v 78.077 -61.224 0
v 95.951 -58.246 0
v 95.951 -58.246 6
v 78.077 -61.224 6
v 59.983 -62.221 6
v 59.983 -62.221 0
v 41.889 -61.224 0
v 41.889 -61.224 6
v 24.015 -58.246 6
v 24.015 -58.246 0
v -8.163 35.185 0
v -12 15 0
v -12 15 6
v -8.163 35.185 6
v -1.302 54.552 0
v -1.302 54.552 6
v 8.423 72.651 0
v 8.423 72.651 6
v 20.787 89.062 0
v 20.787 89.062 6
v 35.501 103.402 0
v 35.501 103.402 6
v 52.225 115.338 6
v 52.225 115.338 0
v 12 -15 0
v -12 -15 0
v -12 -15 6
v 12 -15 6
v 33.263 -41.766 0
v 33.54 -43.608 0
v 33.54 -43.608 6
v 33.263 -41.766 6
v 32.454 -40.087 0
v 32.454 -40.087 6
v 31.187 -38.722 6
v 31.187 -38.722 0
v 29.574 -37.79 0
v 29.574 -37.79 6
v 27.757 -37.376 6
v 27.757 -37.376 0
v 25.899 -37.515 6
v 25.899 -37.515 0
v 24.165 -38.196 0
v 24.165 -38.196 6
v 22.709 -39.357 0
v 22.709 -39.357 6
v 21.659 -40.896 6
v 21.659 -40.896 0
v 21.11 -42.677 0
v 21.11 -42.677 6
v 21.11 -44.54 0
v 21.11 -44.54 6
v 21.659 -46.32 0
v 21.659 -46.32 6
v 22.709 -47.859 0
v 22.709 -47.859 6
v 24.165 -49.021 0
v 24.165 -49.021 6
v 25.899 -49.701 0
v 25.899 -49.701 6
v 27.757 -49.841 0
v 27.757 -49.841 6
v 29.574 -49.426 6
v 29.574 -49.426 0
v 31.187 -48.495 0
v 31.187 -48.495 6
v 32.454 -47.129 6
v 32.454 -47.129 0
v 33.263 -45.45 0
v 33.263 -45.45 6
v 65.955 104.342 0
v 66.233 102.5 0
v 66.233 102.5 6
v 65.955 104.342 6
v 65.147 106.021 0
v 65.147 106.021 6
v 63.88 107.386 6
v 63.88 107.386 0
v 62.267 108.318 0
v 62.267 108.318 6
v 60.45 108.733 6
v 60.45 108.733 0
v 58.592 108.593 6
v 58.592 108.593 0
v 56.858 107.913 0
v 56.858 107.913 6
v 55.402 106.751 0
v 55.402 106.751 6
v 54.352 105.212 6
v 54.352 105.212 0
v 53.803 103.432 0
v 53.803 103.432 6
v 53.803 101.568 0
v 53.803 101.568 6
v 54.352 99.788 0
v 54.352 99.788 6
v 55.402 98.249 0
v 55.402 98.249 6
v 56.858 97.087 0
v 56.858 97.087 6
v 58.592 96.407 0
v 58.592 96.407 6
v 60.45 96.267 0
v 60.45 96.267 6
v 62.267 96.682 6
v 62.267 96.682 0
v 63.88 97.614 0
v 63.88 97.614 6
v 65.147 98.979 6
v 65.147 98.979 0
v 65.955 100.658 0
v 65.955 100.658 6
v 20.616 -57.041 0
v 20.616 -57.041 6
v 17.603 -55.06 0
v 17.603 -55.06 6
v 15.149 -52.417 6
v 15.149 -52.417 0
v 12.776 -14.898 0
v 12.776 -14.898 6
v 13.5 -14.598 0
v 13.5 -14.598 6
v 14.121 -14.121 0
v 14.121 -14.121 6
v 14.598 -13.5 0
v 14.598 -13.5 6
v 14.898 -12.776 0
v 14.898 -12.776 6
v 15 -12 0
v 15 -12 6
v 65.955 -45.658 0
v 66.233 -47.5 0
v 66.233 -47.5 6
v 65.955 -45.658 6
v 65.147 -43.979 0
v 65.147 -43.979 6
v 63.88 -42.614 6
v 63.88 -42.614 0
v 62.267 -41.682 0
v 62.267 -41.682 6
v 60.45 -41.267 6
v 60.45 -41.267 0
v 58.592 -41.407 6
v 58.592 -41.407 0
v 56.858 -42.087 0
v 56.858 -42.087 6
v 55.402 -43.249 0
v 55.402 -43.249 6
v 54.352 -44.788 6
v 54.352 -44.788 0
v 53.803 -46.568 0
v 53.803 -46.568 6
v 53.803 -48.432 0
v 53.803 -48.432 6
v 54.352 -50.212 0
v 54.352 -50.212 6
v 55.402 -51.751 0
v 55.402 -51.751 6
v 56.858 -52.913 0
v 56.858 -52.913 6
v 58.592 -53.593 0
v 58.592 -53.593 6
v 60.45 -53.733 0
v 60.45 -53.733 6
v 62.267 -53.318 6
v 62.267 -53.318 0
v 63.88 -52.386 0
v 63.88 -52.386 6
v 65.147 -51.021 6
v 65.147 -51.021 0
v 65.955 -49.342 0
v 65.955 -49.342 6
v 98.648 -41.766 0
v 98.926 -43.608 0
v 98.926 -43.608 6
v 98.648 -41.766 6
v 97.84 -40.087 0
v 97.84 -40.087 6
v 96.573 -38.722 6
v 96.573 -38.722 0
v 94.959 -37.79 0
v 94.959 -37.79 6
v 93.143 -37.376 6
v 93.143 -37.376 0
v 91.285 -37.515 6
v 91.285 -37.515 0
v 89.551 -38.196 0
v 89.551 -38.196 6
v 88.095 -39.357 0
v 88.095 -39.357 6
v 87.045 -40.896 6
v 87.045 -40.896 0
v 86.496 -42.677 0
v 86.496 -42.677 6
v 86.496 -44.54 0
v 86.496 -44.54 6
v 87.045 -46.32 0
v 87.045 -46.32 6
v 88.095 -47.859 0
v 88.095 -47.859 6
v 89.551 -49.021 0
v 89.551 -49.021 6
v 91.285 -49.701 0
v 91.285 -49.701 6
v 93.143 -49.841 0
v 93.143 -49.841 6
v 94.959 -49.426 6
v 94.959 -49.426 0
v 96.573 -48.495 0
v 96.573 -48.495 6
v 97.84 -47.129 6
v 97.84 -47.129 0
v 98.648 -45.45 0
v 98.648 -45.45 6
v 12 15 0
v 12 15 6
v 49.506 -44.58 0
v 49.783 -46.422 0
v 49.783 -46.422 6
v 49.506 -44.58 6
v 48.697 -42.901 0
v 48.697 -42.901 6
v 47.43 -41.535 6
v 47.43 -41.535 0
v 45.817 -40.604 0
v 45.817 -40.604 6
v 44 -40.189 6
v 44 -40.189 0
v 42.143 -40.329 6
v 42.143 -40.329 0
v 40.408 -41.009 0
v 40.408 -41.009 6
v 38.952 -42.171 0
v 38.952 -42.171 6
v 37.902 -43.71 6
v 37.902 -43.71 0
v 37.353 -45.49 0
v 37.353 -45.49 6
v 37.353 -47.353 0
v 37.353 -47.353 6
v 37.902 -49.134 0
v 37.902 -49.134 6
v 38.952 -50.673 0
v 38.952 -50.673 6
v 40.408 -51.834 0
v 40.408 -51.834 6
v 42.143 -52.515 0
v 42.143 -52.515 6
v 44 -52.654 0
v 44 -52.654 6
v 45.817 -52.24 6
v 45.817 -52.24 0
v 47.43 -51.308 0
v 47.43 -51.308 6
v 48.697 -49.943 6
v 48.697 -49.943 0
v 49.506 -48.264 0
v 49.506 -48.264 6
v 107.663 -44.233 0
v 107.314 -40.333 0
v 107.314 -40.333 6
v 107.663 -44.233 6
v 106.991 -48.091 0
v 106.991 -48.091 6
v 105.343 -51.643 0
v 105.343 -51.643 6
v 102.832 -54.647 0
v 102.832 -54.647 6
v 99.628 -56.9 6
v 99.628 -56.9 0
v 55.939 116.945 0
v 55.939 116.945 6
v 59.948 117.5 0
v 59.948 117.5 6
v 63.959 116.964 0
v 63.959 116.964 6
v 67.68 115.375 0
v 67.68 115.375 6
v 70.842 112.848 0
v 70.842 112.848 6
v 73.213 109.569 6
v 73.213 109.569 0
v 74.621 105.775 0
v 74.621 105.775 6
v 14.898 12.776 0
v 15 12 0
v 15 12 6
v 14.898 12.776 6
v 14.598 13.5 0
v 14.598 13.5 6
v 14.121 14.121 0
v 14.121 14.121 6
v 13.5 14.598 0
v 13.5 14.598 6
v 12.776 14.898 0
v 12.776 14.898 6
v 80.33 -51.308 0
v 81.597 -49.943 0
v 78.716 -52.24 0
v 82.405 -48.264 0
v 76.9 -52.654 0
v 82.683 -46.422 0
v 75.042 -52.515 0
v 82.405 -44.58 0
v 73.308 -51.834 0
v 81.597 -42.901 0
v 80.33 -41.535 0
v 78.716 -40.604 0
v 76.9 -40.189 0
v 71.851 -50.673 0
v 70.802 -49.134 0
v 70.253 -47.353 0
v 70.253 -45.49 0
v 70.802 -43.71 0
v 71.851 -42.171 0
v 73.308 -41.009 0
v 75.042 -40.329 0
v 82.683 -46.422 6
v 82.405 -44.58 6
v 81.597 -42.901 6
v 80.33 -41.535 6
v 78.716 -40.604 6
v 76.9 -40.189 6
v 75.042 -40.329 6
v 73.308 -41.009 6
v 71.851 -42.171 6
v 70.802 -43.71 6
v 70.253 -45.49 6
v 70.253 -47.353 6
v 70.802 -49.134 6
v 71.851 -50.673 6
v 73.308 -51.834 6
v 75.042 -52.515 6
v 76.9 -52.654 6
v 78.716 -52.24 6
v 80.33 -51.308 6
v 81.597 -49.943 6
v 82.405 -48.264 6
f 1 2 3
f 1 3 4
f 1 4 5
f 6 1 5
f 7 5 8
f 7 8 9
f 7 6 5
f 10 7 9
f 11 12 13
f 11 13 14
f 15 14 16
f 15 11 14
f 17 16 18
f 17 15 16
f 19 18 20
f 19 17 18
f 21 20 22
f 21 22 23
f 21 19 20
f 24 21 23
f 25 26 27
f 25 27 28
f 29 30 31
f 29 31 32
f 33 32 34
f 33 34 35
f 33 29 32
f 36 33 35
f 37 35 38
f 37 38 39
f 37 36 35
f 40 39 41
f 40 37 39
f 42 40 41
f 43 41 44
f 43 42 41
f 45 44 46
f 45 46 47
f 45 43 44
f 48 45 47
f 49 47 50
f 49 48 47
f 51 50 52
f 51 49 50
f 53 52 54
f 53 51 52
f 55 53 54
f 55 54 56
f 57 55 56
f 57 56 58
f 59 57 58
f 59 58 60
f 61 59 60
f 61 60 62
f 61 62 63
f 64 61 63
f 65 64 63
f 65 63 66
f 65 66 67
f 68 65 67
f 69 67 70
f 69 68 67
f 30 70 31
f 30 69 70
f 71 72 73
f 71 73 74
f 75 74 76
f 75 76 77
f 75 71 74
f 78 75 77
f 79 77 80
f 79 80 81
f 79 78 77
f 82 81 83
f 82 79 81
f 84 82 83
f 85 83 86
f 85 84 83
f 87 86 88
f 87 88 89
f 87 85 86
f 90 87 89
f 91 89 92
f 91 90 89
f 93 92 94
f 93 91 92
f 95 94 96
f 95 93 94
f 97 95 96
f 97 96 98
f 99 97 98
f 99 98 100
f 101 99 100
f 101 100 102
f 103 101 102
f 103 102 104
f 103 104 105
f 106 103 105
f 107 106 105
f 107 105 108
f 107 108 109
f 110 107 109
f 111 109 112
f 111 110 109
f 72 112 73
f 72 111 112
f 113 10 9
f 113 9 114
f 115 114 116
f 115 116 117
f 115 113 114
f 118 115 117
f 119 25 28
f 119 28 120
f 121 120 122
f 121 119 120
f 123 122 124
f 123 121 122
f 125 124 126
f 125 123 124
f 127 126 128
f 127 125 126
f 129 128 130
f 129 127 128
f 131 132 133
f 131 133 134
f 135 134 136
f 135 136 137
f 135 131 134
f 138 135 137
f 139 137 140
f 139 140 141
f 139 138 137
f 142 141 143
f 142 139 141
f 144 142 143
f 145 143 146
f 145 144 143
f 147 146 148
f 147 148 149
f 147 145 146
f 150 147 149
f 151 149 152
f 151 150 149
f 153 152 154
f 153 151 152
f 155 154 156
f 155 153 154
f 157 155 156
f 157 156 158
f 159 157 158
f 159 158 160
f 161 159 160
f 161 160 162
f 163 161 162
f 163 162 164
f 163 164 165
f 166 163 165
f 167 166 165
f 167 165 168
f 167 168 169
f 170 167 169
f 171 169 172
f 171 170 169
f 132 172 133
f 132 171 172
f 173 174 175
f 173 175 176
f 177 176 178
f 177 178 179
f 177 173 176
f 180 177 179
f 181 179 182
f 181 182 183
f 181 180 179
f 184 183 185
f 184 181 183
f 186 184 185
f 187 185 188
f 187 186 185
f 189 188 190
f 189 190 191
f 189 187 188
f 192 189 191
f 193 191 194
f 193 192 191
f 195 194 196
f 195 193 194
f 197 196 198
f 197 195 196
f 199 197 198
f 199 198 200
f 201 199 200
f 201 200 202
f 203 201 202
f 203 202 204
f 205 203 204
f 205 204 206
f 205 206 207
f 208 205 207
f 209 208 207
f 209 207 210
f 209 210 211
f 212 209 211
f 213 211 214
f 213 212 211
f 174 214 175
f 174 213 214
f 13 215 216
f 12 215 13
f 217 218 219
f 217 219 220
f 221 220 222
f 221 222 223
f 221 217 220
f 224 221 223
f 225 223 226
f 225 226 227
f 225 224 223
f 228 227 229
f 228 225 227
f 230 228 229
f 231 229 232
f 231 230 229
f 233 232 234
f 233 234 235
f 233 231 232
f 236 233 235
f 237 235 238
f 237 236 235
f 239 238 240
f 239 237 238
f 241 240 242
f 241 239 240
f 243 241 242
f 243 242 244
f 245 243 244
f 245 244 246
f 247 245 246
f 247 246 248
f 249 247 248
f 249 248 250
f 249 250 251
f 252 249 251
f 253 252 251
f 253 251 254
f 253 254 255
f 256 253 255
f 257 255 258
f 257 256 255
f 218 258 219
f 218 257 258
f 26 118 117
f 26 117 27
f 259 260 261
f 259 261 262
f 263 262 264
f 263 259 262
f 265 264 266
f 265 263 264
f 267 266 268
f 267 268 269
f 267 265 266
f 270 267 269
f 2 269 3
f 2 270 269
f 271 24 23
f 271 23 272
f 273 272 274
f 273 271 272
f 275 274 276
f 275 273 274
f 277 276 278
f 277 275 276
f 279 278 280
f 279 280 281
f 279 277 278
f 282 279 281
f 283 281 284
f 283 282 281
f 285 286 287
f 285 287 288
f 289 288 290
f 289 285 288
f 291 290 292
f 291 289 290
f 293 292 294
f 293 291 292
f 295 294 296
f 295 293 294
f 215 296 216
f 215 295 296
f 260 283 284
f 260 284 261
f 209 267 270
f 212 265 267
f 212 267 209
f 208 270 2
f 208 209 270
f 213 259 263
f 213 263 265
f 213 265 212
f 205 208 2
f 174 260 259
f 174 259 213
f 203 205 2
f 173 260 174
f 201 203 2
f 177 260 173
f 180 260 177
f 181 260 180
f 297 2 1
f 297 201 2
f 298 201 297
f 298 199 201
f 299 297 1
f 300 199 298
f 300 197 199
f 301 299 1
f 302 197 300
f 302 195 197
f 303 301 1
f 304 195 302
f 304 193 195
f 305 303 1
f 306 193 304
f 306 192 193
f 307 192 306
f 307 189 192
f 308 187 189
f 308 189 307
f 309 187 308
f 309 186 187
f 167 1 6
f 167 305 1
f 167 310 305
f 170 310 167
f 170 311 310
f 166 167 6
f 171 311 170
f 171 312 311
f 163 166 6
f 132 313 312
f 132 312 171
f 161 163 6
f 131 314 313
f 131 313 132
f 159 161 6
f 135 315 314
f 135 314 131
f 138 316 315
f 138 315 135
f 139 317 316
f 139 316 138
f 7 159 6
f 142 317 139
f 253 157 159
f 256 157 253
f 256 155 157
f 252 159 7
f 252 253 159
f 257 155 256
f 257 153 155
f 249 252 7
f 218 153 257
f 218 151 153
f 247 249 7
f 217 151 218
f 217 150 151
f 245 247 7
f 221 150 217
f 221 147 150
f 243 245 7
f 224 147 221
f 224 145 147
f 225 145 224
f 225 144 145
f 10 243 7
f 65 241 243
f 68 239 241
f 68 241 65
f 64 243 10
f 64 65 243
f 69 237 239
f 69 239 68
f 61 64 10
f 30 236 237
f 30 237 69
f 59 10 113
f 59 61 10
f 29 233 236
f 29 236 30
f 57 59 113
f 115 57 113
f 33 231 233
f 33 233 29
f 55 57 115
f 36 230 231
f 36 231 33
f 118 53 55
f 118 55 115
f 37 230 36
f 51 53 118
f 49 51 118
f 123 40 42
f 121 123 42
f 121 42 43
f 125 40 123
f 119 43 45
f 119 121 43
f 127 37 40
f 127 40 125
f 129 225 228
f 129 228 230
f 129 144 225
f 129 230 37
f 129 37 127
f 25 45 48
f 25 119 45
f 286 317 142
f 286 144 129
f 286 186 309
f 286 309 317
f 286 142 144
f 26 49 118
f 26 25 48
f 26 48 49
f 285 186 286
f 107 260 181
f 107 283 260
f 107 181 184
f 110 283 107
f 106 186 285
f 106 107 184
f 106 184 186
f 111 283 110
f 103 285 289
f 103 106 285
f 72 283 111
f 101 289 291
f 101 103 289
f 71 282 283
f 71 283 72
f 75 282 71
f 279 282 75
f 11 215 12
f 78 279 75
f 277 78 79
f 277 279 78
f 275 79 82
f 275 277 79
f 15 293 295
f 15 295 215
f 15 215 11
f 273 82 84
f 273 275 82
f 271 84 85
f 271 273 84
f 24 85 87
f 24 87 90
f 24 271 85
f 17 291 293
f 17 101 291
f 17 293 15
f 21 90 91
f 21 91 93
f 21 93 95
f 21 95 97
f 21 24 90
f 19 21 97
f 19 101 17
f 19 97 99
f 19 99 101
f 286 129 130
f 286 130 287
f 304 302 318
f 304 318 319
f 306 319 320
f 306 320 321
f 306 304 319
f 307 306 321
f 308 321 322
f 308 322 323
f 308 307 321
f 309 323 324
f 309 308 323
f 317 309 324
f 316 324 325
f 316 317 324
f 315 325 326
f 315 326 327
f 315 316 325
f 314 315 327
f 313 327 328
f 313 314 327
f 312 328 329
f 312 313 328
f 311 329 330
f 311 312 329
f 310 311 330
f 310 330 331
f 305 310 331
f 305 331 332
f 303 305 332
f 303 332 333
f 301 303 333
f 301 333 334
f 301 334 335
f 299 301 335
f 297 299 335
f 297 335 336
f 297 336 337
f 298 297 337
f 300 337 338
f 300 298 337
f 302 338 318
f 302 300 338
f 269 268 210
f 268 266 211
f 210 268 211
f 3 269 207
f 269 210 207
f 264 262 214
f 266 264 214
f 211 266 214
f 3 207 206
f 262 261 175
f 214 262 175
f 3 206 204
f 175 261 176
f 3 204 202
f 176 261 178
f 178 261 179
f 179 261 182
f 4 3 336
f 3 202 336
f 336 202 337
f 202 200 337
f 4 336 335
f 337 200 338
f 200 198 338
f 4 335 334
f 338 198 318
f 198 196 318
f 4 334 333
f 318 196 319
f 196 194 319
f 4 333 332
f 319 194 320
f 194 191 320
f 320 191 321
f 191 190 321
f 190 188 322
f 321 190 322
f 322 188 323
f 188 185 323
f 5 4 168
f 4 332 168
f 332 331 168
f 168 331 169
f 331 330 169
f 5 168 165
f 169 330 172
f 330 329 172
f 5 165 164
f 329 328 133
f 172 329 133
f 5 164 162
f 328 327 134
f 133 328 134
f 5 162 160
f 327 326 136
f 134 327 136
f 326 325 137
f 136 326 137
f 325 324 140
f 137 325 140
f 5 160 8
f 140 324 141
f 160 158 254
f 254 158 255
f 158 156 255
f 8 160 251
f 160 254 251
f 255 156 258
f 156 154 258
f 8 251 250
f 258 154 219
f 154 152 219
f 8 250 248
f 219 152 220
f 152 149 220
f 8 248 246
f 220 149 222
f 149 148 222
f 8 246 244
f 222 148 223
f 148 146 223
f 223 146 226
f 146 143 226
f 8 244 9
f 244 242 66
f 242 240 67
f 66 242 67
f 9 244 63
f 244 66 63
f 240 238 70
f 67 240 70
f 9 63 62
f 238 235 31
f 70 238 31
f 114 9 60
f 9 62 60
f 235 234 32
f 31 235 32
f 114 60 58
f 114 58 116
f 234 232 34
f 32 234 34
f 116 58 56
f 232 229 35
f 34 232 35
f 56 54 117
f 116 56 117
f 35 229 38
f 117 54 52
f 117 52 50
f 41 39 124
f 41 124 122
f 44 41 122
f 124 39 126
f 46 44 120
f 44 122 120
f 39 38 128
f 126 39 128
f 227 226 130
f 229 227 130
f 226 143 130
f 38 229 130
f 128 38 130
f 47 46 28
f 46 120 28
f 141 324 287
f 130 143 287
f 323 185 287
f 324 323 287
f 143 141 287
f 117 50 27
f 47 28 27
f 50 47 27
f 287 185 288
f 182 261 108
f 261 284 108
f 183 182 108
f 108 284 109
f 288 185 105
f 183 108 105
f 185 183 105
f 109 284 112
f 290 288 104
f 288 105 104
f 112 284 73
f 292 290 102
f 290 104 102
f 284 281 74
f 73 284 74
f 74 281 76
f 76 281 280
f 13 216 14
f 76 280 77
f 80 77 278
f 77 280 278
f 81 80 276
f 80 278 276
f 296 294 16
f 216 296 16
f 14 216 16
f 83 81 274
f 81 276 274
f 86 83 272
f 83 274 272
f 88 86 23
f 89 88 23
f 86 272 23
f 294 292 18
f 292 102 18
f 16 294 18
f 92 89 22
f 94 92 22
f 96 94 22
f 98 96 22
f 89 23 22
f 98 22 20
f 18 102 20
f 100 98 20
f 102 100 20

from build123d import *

# Parameters (mm, degrees)
SKETCH_1_R             = 6.25
SM_BASE_FLANGE_1_DEPTH = 6


# Sheet-metal steps are written as plain solids
with BuildPart() as part:
    # Sketch 1 → Базовая кромка1 (new body)
    with BuildSketch(Plane.XY):
        with BuildLine():
            Line((-12, -15), (12, -15))
            ThreePointArc((12, -15), (14.121320344, -14.121320344), (15, -12))
            Line((15, -12), (15, 12))
            ThreePointArc((15, 12), (14.121320344, 14.121320344), (12, 15))
            Line((12, 15), (-12, 15))
            ThreePointArc((-12, 15), (8.423008458, 72.651269477), (52.225050565, 115.337909706))
            ThreePointArc((52.225050565, 115.337909706), (65.873295621, 116.29514987), (74.621175956, 105.775383166))
            Line((74.621175956, 105.775383166), (107.314124719, -40.33280529))
            ThreePointArc((107.314124719, -40.33280529), (105.342791215, -51.642791703), (95.951479838, -58.246216503))
            ThreePointArc((95.951479838, -58.246216503), (59.983147908, -62.22117964), (24.014815979, -58.246216503))
            ThreePointArc((24.014815979, -58.246216503), (19.049536185, -56.141802219), (15.149410164, -52.417345221))
            Line((15.149410164, -52.417345221), (-12, -15))
        make_face()
        with Locations((59.983147908, 102.5)):
            Circle(SKETCH_1_R, mode=Mode.SUBTRACT)
        with Locations((27.290199146, -43.608188456)):
            Circle(SKETCH_1_R, mode=Mode.SUBTRACT)
        with Locations((43.533377705, -46.421825098)):
            Circle(SKETCH_1_R, mode=Mode.SUBTRACT)
        with Locations((59.983147908, -47.5)):
            Circle(SKETCH_1_R, mode=Mode.SUBTRACT)
        with Locations((76.432918112, -46.421825098)):
            Circle(SKETCH_1_R, mode=Mode.SUBTRACT)
        with Locations((92.676096671, -43.608188456)):
            Circle(SKETCH_1_R, mode=Mode.SUBTRACT)
    extrude(amount=SM_BASE_FLANGE_1_DEPTH)


solid = part.part
